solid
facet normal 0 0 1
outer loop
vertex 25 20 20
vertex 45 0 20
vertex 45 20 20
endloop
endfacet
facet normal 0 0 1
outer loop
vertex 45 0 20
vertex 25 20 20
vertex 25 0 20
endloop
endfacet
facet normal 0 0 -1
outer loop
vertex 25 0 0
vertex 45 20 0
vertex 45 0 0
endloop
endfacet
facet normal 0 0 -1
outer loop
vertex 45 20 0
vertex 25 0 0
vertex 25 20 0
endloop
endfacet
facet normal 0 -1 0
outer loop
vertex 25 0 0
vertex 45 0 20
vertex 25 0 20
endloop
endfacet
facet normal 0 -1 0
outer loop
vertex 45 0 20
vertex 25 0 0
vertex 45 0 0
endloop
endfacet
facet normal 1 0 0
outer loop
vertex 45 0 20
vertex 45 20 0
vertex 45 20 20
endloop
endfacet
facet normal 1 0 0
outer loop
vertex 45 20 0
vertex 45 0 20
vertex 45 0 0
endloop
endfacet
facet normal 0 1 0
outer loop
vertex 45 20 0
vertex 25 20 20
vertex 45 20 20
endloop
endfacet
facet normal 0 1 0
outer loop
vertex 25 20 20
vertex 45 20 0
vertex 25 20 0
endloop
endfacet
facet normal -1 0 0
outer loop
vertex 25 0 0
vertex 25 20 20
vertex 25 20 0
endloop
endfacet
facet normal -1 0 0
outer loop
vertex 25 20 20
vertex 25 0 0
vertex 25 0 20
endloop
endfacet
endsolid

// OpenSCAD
// Sub-module B, clear of A -- no overlap between the two named features.

$fa = 2; $fs = 0.3;

// EXPECTED_BBOX: [20, 20, 20]
translate([25, 0, 0]) cube([20, 20, 20]);
